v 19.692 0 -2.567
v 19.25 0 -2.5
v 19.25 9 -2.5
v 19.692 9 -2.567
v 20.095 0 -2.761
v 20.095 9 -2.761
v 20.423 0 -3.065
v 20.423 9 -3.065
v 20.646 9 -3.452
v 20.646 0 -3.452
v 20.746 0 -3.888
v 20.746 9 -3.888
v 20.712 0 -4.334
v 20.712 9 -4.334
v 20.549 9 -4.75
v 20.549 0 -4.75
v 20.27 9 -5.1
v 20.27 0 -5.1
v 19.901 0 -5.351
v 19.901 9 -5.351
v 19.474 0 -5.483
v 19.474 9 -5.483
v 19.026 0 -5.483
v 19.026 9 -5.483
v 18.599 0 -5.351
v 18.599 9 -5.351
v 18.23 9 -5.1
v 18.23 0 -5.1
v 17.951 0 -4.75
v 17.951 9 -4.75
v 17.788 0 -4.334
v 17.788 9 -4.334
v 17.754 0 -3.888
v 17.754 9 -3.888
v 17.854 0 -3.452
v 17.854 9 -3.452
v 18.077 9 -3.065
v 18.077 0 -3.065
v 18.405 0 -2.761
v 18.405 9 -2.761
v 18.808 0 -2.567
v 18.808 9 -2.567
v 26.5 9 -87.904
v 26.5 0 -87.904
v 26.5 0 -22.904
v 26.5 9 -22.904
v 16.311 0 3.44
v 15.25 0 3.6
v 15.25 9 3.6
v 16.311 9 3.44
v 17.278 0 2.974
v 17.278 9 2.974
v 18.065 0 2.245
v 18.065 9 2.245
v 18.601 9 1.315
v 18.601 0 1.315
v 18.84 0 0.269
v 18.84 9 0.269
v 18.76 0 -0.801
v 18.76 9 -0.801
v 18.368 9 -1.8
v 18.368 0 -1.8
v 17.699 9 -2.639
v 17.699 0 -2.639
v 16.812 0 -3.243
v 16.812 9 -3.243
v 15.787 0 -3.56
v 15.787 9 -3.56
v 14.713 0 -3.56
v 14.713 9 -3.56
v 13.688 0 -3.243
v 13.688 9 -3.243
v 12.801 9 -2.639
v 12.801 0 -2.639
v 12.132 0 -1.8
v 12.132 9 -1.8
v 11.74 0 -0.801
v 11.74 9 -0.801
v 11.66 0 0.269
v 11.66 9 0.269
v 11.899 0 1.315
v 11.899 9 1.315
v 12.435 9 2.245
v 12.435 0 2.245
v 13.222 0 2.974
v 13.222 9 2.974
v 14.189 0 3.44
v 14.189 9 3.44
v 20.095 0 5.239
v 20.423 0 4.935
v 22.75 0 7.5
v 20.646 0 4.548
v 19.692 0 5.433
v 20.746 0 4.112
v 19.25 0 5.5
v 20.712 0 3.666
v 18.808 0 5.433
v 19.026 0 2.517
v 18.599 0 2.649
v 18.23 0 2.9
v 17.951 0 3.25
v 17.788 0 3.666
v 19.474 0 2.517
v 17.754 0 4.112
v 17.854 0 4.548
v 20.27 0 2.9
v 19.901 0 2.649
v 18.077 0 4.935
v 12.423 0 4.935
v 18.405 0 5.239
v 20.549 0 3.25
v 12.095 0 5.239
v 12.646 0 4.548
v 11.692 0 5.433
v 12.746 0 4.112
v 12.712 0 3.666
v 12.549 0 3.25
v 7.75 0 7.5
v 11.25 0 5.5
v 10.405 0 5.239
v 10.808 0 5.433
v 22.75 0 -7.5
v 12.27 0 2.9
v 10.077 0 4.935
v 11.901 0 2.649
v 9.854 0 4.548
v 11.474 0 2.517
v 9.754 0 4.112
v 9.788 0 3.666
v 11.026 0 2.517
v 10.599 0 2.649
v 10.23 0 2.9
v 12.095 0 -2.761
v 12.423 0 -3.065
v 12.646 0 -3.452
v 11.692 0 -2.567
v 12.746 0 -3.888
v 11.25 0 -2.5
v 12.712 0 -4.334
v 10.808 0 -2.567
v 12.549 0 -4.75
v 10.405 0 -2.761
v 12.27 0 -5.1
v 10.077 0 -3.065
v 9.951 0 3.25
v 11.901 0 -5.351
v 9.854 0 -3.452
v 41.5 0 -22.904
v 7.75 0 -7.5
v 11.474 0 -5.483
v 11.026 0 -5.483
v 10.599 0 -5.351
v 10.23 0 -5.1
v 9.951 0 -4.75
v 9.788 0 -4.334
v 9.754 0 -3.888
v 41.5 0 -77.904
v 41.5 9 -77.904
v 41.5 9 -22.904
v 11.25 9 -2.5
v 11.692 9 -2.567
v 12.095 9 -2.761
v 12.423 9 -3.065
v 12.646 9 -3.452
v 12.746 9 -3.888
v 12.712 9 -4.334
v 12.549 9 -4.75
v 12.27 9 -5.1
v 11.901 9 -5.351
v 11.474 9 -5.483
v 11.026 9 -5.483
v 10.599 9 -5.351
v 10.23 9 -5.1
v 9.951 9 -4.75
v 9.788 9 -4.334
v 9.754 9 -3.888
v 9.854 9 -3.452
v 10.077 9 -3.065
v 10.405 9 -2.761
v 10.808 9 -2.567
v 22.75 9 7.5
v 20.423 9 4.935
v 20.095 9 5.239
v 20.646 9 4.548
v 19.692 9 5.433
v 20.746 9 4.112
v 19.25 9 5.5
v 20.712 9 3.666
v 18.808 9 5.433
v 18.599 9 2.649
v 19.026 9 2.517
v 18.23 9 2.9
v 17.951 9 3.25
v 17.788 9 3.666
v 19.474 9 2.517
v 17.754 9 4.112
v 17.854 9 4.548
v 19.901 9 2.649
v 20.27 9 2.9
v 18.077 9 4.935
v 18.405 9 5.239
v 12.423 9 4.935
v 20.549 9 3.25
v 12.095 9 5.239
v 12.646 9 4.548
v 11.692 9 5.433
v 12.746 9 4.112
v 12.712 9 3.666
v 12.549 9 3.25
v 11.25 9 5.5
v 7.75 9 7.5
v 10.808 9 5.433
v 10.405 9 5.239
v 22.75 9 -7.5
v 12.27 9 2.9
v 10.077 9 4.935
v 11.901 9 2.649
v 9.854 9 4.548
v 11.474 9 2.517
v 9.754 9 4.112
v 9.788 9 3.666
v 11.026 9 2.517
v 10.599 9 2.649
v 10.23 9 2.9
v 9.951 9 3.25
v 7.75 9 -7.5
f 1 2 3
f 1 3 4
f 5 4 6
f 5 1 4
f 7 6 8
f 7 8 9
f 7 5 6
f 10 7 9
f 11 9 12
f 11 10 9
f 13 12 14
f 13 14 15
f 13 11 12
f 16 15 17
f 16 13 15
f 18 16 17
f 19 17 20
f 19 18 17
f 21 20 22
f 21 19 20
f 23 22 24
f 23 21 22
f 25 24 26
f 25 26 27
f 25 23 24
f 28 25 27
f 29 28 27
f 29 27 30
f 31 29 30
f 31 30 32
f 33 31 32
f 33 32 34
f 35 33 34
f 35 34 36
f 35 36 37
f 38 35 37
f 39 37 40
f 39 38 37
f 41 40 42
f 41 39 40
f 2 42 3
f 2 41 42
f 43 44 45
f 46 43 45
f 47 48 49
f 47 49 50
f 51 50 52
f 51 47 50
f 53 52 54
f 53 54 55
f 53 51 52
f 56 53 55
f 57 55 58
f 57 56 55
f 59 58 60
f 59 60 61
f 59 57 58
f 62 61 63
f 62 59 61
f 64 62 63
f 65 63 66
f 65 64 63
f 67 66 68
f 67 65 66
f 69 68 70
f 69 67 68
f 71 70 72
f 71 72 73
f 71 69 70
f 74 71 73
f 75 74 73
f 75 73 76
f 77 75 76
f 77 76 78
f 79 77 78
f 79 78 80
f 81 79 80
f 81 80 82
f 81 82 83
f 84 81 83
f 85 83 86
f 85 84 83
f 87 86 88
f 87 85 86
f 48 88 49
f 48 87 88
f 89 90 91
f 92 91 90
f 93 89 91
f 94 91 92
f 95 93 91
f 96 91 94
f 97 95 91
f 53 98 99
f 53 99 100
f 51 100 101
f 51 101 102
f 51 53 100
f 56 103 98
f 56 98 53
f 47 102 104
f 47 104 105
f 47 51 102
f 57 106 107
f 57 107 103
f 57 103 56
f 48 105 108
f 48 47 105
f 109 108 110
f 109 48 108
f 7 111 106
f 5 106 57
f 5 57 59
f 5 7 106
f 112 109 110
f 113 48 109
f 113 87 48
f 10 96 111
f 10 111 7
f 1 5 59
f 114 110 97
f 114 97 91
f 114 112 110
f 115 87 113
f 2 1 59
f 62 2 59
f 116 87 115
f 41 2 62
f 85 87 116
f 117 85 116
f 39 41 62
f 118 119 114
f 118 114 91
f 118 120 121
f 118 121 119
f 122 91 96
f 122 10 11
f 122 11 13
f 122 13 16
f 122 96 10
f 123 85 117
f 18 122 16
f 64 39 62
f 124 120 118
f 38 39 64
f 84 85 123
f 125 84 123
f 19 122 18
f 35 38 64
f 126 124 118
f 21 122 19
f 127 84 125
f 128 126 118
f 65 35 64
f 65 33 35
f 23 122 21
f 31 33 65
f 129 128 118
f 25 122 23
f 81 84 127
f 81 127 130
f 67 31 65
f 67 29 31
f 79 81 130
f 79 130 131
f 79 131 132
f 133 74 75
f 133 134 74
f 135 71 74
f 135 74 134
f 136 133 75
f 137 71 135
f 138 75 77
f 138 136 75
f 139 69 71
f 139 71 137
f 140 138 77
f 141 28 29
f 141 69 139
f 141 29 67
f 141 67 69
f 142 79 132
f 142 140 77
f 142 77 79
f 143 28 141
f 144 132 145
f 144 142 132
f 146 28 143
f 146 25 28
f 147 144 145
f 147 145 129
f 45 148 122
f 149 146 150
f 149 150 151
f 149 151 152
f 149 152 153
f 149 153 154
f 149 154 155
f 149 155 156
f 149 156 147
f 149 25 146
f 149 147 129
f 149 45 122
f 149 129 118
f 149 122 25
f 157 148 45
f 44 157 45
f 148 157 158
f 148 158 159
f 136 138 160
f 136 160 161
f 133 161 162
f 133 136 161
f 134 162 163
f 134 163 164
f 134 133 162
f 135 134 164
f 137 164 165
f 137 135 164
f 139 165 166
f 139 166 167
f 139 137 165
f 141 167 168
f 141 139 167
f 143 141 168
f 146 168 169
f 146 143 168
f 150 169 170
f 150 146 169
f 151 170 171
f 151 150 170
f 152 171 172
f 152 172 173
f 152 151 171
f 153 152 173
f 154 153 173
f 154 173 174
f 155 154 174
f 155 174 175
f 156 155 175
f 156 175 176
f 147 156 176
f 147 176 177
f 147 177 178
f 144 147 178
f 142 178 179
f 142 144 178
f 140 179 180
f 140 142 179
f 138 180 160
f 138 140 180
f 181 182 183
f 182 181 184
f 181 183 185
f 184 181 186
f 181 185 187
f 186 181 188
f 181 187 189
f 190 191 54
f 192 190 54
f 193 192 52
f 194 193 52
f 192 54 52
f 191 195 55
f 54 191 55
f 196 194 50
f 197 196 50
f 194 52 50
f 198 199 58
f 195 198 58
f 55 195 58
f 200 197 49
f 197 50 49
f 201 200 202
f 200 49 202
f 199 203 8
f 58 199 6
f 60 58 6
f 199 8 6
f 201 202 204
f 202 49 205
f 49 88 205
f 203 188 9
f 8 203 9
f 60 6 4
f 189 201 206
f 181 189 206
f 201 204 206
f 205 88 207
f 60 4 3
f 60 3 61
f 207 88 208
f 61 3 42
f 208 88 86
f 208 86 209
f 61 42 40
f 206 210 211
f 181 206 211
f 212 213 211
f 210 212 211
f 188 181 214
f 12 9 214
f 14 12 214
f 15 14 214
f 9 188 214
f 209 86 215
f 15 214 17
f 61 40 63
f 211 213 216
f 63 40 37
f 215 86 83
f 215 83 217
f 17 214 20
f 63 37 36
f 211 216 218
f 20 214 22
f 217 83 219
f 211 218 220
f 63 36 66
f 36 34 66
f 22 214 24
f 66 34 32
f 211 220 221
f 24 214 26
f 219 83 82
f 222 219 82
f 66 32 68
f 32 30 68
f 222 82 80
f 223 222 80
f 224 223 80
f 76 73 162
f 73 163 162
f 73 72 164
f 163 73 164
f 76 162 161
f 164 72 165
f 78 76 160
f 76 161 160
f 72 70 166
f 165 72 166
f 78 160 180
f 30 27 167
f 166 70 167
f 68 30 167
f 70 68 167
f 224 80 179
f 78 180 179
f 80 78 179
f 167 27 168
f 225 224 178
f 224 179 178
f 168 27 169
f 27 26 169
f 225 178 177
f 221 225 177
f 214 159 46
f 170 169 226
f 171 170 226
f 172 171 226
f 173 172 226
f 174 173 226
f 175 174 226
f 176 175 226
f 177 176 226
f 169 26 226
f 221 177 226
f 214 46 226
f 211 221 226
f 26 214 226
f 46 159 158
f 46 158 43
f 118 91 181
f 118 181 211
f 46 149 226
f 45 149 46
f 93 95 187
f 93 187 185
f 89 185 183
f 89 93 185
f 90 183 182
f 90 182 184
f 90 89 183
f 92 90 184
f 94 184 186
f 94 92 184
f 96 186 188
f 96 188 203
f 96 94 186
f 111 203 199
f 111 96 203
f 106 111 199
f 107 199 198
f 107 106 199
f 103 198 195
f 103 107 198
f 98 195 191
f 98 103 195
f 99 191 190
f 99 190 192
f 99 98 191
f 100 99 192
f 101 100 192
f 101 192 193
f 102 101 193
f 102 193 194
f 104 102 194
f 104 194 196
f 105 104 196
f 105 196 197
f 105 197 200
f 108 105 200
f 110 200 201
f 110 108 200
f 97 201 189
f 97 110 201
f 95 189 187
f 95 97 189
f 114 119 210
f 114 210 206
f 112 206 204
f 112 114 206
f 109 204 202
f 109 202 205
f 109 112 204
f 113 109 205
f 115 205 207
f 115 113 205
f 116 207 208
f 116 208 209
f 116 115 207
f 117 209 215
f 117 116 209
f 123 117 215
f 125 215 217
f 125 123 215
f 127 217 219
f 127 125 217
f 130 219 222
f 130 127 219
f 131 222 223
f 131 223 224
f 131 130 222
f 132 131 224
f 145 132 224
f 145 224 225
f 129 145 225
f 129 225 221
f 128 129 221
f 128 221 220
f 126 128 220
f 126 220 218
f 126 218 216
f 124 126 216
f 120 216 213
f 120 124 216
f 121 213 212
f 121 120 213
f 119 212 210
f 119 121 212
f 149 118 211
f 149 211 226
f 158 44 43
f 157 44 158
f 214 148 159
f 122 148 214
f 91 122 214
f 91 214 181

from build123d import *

# Parameters (mm, degrees)
CROQUIS1_R              = 1.5
CROQUIS1_R_2            = 3.6
SALIENTE_EXTRUIR2_DEPTH = 9


with BuildPart() as part:
    # Croquis1 → Saliente-Extruir2 (new body)
    with BuildSketch(Plane(origin=(0, 0, 0), x_dir=(1, 0, 0), z_dir=(0, 1, 0))):
        Polygon((7.75, 7.5), (26.5, 22.904273087), (26.5, 77.904273087), (26.5, 87.904273087), (41.5, 77.904273087), (41.5, 22.904273087), (22.75, 7.5), (22.75, -7.5), (7.75, -7.5), align=None)
        with Locations(Location((19.25, 4, 0), (0, 0, 270))):
            Circle(CROQUIS1_R, mode=Mode.SUBTRACT)
        with Locations(Location((19.25, -4, 0), (0, 0, 270))):
            Circle(CROQUIS1_R, mode=Mode.SUBTRACT)
        with Locations(Location((11.25, -4, 0), (0, 0, 270))):
            Circle(CROQUIS1_R, mode=Mode.SUBTRACT)
        with Locations(Location((11.25, 4, 0), (0, 0, 270))):
            Circle(CROQUIS1_R, mode=Mode.SUBTRACT)
        with Locations(Location((15.25, 0, 0), (0, 0, 270))):
            Circle(CROQUIS1_R_2, mode=Mode.SUBTRACT)
    extrude(amount=SALIENTE_EXTRUIR2_DEPTH)


solid = part.part
